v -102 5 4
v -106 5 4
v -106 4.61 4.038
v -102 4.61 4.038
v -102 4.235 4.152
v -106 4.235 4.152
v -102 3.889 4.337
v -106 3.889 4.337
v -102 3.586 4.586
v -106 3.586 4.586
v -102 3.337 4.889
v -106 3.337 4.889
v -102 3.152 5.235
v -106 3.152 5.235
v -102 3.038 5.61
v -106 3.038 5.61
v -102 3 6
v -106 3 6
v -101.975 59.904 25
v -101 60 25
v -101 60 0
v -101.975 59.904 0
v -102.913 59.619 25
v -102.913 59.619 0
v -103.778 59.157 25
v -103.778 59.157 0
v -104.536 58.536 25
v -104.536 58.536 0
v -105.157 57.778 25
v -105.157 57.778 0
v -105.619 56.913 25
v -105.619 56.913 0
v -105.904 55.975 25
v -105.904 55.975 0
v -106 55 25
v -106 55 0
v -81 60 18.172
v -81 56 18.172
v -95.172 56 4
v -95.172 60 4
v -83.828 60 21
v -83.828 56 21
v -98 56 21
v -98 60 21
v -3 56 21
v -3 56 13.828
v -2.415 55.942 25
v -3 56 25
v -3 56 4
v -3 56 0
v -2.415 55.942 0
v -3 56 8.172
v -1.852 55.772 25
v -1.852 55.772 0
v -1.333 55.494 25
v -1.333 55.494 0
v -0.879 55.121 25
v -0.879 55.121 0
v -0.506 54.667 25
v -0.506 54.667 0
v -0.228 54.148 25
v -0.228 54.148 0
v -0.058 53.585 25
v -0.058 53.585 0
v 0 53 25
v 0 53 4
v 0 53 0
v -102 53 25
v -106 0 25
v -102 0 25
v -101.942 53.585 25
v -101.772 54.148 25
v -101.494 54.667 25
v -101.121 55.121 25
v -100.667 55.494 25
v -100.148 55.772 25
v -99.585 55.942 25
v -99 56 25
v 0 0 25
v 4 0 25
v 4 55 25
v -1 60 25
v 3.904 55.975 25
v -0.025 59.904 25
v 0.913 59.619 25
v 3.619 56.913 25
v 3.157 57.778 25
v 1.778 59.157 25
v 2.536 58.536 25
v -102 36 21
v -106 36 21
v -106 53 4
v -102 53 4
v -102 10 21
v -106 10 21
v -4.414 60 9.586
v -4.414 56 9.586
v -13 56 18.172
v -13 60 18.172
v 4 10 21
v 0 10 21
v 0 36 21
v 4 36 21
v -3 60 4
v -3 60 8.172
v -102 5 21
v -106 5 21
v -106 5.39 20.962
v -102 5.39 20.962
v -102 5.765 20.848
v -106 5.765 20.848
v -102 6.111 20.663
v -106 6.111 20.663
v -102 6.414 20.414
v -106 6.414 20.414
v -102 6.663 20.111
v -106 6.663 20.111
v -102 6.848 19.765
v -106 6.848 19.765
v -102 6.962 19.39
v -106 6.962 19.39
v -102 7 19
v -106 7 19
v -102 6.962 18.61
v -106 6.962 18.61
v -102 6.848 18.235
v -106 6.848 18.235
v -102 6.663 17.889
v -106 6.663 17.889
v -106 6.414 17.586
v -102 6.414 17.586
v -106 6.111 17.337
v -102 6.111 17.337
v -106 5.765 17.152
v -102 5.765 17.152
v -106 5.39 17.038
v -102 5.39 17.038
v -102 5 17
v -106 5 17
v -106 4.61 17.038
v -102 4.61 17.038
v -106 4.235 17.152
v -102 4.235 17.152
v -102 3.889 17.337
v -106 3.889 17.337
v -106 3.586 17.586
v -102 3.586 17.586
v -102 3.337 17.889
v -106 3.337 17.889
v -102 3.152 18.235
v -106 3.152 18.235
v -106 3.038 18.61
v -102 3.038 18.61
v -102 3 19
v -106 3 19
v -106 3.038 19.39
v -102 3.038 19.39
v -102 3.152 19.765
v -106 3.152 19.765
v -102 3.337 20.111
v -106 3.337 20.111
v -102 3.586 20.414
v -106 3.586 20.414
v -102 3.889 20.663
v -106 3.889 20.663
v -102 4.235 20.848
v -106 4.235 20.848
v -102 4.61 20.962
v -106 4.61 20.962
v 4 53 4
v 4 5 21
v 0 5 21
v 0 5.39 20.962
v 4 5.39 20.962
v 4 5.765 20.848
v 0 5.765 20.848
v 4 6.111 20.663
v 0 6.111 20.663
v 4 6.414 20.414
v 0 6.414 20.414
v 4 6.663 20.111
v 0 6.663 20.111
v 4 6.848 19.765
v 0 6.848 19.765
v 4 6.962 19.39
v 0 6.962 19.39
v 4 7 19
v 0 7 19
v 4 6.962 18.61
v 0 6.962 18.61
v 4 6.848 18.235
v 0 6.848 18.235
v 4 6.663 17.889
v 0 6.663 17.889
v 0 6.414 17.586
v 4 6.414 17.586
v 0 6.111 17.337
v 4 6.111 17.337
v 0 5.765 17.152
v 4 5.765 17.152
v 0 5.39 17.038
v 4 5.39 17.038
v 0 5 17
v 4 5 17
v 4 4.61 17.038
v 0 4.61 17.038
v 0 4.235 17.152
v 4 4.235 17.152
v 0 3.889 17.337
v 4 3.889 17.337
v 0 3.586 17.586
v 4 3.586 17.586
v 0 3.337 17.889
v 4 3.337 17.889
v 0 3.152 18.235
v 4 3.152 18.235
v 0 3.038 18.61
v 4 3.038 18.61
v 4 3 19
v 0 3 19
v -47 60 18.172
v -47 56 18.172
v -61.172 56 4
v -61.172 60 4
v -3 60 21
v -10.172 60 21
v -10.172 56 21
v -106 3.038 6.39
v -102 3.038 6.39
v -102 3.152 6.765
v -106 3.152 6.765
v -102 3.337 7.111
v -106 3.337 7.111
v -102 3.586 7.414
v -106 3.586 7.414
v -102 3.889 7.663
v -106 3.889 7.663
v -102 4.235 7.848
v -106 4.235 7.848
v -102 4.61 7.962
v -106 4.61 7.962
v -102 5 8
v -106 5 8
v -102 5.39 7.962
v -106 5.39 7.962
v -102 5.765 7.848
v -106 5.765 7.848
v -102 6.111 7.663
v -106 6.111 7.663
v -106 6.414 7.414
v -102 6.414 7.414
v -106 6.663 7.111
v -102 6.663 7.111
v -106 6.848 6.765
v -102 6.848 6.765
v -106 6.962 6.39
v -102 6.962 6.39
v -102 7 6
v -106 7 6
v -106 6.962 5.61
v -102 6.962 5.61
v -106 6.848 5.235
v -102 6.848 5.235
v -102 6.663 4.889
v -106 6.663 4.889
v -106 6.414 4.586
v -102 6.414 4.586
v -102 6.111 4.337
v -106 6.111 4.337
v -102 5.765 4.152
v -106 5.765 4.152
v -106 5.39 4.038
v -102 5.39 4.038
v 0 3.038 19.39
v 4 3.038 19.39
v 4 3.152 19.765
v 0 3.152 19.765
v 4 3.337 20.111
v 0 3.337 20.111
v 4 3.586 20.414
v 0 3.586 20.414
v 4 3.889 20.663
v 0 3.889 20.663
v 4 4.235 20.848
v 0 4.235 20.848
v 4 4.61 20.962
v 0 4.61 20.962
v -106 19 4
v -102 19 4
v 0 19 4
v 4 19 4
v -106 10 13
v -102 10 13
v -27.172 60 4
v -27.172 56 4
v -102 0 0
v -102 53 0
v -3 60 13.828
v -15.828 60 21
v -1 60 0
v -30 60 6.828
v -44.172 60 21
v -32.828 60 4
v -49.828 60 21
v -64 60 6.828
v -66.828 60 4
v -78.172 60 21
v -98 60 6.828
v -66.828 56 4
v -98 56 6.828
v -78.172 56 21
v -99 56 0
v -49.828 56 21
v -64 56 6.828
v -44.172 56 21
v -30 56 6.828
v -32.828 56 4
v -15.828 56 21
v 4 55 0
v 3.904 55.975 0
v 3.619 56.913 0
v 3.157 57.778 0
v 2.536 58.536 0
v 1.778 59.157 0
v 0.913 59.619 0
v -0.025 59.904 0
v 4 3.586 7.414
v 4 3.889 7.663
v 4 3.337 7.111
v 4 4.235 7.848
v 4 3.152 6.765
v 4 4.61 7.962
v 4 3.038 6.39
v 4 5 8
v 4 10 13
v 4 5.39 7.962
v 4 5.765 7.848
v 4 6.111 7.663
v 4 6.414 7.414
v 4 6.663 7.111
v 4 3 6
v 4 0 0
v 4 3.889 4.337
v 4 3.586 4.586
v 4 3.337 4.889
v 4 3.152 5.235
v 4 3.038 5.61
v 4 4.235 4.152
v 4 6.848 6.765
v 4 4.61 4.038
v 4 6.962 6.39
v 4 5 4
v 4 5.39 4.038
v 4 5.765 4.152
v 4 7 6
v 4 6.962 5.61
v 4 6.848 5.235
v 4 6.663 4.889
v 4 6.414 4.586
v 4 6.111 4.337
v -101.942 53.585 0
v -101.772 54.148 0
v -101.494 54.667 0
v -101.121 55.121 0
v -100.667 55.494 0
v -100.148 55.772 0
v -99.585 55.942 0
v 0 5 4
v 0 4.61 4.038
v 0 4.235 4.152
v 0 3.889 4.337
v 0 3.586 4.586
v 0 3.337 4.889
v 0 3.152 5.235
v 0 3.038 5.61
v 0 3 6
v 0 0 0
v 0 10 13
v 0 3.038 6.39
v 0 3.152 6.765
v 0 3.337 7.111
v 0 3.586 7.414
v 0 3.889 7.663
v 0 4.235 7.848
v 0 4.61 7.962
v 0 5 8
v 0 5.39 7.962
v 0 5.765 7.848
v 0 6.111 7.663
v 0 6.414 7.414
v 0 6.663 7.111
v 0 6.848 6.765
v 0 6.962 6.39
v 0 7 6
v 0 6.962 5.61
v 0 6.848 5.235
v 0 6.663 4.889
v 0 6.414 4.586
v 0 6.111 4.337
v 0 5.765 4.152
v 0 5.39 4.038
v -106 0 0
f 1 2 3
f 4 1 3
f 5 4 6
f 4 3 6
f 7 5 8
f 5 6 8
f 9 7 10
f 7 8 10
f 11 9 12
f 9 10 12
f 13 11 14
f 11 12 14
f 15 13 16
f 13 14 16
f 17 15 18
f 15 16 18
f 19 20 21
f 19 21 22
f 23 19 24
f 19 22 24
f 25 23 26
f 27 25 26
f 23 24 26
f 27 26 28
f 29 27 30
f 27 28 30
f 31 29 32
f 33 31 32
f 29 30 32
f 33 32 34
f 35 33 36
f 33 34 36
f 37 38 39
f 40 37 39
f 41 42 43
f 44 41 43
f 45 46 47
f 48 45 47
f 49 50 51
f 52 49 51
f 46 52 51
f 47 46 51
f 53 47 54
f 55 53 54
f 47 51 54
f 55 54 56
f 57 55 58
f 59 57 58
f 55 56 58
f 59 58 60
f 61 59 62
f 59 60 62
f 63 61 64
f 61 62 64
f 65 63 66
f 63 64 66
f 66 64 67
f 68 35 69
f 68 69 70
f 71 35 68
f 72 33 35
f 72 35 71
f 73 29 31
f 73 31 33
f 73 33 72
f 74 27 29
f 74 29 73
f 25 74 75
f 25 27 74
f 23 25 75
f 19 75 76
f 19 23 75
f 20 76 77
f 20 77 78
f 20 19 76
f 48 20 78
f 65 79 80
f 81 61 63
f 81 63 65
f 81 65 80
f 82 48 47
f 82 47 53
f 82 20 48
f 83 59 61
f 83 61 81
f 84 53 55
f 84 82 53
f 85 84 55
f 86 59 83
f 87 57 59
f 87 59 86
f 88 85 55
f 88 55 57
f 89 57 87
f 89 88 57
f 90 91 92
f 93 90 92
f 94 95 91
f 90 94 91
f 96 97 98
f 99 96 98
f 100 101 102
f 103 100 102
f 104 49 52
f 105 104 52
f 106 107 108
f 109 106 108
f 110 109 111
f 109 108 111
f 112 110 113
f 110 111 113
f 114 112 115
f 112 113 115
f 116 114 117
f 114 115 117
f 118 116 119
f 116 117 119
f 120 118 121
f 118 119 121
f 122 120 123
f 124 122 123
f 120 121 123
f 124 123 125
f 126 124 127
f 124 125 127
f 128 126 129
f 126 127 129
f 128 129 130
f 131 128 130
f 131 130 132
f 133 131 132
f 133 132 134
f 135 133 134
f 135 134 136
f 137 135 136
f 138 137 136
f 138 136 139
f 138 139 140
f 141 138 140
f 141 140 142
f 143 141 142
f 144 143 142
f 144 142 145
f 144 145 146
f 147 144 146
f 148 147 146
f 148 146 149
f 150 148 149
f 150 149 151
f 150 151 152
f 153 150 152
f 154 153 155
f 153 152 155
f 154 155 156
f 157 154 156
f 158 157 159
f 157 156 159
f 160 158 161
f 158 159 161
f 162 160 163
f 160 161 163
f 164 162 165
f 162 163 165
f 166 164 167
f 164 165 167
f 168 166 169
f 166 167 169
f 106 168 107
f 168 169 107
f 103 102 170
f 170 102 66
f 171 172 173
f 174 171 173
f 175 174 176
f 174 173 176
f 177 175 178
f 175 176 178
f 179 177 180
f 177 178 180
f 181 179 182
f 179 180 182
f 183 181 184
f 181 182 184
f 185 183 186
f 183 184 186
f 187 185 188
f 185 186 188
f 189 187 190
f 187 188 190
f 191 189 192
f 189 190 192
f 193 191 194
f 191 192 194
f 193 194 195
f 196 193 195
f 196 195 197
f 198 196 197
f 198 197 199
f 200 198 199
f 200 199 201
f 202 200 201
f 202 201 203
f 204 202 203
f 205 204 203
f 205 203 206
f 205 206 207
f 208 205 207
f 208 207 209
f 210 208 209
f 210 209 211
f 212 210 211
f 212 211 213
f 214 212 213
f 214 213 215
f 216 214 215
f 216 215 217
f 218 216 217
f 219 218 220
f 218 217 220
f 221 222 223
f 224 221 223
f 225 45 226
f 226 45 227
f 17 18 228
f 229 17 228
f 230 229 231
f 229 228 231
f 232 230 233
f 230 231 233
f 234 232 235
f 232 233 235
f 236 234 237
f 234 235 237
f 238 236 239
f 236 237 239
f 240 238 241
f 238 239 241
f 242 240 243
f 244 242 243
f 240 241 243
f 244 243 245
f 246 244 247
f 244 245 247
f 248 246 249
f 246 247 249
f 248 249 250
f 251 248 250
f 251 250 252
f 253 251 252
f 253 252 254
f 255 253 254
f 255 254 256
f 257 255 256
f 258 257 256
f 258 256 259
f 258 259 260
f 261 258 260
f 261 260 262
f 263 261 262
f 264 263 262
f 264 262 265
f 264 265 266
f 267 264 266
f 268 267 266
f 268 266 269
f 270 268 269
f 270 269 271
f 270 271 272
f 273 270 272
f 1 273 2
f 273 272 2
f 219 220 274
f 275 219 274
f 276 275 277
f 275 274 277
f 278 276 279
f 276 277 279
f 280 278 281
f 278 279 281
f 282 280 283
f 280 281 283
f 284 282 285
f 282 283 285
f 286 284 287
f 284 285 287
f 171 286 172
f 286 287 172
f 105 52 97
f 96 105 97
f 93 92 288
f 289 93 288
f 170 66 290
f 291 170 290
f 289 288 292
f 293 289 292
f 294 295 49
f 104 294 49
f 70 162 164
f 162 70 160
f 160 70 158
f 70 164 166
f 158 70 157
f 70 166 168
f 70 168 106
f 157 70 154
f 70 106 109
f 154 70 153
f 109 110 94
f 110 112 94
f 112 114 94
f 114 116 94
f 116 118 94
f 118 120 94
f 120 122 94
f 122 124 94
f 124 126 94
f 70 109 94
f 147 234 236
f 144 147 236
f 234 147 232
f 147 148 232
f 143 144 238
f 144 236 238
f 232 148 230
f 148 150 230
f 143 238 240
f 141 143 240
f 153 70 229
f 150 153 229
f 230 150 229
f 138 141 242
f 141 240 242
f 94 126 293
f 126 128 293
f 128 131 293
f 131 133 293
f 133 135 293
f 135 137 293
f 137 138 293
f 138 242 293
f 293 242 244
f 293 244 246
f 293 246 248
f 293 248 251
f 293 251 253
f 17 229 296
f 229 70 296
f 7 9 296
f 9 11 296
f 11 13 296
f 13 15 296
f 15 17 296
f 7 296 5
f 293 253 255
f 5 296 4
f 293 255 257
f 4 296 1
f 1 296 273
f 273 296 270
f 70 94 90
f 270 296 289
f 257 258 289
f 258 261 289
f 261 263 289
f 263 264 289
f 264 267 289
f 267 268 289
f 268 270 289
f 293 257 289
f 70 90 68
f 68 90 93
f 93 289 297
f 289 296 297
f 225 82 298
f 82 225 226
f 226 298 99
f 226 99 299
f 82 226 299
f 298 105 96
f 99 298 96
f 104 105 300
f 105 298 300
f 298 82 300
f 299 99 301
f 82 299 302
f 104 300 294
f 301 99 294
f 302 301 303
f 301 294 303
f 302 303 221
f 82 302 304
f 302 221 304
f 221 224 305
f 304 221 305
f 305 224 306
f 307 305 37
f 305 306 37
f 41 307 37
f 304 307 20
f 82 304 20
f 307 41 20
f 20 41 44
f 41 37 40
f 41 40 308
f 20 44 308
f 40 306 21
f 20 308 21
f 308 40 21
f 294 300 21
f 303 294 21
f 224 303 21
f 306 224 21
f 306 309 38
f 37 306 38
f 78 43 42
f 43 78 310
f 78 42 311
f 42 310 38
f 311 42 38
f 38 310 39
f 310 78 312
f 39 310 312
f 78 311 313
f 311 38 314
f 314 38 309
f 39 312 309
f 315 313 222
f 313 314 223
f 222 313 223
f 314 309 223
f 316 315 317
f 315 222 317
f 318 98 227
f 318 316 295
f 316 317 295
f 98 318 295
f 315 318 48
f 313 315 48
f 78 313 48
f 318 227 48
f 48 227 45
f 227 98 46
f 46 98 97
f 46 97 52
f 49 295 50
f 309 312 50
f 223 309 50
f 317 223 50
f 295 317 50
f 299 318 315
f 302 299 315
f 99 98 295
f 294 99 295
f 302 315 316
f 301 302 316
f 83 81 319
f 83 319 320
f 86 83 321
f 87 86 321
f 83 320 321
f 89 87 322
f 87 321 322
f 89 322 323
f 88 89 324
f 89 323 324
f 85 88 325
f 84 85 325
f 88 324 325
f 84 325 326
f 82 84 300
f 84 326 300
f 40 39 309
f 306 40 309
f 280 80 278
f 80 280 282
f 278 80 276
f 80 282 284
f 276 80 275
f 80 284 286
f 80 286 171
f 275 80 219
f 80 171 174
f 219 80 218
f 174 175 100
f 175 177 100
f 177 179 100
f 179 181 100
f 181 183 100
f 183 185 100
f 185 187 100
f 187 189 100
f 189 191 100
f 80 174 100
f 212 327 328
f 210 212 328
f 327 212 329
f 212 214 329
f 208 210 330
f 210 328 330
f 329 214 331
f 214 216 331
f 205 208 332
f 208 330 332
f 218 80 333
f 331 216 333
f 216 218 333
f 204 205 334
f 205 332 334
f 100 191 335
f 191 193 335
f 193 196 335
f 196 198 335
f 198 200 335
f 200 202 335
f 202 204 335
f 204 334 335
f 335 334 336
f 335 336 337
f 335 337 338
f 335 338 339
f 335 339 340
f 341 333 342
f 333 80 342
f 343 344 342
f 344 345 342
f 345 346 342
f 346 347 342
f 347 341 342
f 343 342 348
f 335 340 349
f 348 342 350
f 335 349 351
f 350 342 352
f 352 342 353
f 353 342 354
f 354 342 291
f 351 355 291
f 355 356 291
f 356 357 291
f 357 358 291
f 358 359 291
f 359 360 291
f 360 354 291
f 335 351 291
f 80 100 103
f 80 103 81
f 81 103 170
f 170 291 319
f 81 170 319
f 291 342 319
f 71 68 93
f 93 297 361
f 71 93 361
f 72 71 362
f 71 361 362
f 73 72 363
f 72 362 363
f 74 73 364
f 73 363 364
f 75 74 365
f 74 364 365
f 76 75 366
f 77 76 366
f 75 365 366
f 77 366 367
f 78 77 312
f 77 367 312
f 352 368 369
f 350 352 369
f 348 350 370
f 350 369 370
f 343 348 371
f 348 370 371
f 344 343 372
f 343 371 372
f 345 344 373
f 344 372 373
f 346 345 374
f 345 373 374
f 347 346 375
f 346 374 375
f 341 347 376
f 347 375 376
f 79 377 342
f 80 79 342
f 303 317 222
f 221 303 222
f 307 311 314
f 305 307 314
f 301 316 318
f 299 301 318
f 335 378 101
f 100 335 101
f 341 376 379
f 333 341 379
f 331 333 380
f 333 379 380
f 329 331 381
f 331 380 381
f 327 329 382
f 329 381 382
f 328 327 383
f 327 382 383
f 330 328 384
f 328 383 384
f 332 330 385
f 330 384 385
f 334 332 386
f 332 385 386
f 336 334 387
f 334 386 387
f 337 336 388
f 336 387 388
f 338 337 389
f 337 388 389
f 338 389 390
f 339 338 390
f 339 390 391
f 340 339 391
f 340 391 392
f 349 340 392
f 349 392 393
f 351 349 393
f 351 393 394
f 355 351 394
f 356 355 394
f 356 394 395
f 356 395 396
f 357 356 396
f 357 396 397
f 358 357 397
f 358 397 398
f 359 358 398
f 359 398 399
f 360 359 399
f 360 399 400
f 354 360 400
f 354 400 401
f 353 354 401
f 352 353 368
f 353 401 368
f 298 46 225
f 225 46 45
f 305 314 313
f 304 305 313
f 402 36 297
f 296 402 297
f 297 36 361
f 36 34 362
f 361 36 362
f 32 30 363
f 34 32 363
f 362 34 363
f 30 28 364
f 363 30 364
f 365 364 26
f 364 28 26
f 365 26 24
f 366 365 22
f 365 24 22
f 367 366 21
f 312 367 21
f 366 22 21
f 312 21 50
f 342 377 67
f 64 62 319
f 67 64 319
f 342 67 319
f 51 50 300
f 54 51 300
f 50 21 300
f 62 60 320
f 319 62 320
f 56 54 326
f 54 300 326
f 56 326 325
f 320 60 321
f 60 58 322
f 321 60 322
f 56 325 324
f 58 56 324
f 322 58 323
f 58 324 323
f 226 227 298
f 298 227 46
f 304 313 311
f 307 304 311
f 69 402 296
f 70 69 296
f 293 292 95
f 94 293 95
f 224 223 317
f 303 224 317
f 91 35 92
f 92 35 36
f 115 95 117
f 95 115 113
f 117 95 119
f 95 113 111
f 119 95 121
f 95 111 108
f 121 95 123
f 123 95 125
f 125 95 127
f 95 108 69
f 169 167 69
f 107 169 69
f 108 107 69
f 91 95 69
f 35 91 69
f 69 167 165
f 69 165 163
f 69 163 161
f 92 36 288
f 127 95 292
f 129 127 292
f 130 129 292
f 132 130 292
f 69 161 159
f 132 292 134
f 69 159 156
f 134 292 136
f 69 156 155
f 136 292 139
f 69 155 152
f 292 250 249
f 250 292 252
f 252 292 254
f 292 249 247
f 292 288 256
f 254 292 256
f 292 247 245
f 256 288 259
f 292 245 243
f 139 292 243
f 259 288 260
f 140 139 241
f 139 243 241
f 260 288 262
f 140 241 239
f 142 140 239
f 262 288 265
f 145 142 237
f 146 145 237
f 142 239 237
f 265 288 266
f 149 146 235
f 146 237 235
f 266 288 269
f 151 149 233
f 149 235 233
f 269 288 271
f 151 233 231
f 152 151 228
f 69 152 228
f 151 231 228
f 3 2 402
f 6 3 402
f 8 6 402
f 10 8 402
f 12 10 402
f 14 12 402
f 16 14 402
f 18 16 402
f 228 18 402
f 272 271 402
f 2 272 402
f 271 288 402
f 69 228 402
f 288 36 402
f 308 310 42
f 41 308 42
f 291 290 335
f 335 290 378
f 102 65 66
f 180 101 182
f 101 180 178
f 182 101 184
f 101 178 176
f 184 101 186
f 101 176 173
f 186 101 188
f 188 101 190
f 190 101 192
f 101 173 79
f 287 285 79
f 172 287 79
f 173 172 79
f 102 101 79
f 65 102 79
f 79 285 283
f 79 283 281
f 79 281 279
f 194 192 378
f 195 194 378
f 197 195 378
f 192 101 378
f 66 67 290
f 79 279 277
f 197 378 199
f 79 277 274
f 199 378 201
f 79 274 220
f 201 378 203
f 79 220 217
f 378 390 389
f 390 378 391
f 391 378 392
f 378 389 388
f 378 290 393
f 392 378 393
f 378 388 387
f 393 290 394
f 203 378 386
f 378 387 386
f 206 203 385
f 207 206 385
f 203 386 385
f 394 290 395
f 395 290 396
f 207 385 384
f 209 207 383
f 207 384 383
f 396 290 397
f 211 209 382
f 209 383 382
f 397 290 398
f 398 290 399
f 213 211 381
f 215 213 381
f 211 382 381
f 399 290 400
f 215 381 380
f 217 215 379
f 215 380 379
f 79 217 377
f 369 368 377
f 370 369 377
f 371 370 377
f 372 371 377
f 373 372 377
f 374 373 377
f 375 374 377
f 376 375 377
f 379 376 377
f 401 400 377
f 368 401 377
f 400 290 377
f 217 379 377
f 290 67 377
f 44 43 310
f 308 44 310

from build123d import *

# Parameters (mm, degrees)
F1_DEPTH = 25
F3_DEPTH = 25
F5_DEPTH = 200


with BuildPart() as f1:
    # F0 (on Top) → F1 (new body)
    with BuildSketch(Plane.XY):
        with BuildLine():
            Line((0, 53), (0, 0))
            Line((0, 0), (4, 0))
            Line((4, 0), (4, 55))
            ThreePointArc((4, 55), (2.5355339059, 58.5355339059), (-1, 60))
            Line((-1, 60), (-101, 60))
            ThreePointArc((-101, 60), (-104.5355339059, 58.5355339059), (-106, 55))
            Line((-106, 55), (-106, 0))
            Line((-106, 0), (-102, 0))
            Line((-102, 0), (-102, 53))
            ThreePointArc((-102, 53), (-101.1213203436, 55.1213203436), (-99, 56))
            Line((-99, 56), (-3, 56))
            ThreePointArc((-3, 56), (-0.8786796564, 55.1213203436), (0, 53))
        make_face()
    extrude(amount=F1_DEPTH)

    # F2 (on face) → F3 (cut)
    with BuildSketch(Plane.XZ.offset(-56)):
        Polygon((-49.8284271247, 21), (-78.1715728753, 21), (-64, 6.8284271247), align=None)
        Polygon((-30, 6.8284271247), (-15.8284271247, 21), (-44.1715728753, 21), align=None)
        Polygon((-95.1715728753, 4), (-66.8284271247, 4), (-81, 18.1715728753), align=None)
        Polygon((-10.1715728753, 21), (-3, 13.8284271247), (-3, 21), align=None)
        Polygon((-98, 21), (-98, 6.8284271247), (-83.8284271247, 21), align=None)
        Polygon((-61.1715728753, 4), (-32.8284271247, 4), (-47, 18.1715728753), align=None)
        Polygon((-4.4142135624, 9.5857864376), (-13, 18.1715728753), (-27.1715728753, 4), (-3, 4), (-3, 8.1715728753), align=None)
    extrude(amount=-F3_DEPTH, mode=Mode.SUBTRACT)

    # F4 (on face) → F5 (cut)
    with BuildSketch(Plane(origin=(-106, 0, 0), x_dir=(0, -1, 0), z_dir=(-1, 0, 0))):
        with BuildLine():
            ThreePointArc((-5, 21), (-6.4142135624, 17.5857864376), (-3, 19))
            ThreePointArc((-3, 19), (-3.5857864376, 20.4142135624), (-5, 21))
        make_face()
        with BuildLine():
            ThreePointArc((-3, 6), (-6.4142135624, 7.4142135624), (-5, 4))
            ThreePointArc((-5, 4), (-3.5857864376, 4.5857864376), (-3, 6))
        make_face()
        Polygon((-10, 13), (-10, 21), (-36, 21), (-19, 4), align=None)
        Polygon((-19, 4), (-36, 21), (-53, 4), align=None)
    extrude(amount=-F5_DEPTH, mode=Mode.SUBTRACT)


solid = f1.part
